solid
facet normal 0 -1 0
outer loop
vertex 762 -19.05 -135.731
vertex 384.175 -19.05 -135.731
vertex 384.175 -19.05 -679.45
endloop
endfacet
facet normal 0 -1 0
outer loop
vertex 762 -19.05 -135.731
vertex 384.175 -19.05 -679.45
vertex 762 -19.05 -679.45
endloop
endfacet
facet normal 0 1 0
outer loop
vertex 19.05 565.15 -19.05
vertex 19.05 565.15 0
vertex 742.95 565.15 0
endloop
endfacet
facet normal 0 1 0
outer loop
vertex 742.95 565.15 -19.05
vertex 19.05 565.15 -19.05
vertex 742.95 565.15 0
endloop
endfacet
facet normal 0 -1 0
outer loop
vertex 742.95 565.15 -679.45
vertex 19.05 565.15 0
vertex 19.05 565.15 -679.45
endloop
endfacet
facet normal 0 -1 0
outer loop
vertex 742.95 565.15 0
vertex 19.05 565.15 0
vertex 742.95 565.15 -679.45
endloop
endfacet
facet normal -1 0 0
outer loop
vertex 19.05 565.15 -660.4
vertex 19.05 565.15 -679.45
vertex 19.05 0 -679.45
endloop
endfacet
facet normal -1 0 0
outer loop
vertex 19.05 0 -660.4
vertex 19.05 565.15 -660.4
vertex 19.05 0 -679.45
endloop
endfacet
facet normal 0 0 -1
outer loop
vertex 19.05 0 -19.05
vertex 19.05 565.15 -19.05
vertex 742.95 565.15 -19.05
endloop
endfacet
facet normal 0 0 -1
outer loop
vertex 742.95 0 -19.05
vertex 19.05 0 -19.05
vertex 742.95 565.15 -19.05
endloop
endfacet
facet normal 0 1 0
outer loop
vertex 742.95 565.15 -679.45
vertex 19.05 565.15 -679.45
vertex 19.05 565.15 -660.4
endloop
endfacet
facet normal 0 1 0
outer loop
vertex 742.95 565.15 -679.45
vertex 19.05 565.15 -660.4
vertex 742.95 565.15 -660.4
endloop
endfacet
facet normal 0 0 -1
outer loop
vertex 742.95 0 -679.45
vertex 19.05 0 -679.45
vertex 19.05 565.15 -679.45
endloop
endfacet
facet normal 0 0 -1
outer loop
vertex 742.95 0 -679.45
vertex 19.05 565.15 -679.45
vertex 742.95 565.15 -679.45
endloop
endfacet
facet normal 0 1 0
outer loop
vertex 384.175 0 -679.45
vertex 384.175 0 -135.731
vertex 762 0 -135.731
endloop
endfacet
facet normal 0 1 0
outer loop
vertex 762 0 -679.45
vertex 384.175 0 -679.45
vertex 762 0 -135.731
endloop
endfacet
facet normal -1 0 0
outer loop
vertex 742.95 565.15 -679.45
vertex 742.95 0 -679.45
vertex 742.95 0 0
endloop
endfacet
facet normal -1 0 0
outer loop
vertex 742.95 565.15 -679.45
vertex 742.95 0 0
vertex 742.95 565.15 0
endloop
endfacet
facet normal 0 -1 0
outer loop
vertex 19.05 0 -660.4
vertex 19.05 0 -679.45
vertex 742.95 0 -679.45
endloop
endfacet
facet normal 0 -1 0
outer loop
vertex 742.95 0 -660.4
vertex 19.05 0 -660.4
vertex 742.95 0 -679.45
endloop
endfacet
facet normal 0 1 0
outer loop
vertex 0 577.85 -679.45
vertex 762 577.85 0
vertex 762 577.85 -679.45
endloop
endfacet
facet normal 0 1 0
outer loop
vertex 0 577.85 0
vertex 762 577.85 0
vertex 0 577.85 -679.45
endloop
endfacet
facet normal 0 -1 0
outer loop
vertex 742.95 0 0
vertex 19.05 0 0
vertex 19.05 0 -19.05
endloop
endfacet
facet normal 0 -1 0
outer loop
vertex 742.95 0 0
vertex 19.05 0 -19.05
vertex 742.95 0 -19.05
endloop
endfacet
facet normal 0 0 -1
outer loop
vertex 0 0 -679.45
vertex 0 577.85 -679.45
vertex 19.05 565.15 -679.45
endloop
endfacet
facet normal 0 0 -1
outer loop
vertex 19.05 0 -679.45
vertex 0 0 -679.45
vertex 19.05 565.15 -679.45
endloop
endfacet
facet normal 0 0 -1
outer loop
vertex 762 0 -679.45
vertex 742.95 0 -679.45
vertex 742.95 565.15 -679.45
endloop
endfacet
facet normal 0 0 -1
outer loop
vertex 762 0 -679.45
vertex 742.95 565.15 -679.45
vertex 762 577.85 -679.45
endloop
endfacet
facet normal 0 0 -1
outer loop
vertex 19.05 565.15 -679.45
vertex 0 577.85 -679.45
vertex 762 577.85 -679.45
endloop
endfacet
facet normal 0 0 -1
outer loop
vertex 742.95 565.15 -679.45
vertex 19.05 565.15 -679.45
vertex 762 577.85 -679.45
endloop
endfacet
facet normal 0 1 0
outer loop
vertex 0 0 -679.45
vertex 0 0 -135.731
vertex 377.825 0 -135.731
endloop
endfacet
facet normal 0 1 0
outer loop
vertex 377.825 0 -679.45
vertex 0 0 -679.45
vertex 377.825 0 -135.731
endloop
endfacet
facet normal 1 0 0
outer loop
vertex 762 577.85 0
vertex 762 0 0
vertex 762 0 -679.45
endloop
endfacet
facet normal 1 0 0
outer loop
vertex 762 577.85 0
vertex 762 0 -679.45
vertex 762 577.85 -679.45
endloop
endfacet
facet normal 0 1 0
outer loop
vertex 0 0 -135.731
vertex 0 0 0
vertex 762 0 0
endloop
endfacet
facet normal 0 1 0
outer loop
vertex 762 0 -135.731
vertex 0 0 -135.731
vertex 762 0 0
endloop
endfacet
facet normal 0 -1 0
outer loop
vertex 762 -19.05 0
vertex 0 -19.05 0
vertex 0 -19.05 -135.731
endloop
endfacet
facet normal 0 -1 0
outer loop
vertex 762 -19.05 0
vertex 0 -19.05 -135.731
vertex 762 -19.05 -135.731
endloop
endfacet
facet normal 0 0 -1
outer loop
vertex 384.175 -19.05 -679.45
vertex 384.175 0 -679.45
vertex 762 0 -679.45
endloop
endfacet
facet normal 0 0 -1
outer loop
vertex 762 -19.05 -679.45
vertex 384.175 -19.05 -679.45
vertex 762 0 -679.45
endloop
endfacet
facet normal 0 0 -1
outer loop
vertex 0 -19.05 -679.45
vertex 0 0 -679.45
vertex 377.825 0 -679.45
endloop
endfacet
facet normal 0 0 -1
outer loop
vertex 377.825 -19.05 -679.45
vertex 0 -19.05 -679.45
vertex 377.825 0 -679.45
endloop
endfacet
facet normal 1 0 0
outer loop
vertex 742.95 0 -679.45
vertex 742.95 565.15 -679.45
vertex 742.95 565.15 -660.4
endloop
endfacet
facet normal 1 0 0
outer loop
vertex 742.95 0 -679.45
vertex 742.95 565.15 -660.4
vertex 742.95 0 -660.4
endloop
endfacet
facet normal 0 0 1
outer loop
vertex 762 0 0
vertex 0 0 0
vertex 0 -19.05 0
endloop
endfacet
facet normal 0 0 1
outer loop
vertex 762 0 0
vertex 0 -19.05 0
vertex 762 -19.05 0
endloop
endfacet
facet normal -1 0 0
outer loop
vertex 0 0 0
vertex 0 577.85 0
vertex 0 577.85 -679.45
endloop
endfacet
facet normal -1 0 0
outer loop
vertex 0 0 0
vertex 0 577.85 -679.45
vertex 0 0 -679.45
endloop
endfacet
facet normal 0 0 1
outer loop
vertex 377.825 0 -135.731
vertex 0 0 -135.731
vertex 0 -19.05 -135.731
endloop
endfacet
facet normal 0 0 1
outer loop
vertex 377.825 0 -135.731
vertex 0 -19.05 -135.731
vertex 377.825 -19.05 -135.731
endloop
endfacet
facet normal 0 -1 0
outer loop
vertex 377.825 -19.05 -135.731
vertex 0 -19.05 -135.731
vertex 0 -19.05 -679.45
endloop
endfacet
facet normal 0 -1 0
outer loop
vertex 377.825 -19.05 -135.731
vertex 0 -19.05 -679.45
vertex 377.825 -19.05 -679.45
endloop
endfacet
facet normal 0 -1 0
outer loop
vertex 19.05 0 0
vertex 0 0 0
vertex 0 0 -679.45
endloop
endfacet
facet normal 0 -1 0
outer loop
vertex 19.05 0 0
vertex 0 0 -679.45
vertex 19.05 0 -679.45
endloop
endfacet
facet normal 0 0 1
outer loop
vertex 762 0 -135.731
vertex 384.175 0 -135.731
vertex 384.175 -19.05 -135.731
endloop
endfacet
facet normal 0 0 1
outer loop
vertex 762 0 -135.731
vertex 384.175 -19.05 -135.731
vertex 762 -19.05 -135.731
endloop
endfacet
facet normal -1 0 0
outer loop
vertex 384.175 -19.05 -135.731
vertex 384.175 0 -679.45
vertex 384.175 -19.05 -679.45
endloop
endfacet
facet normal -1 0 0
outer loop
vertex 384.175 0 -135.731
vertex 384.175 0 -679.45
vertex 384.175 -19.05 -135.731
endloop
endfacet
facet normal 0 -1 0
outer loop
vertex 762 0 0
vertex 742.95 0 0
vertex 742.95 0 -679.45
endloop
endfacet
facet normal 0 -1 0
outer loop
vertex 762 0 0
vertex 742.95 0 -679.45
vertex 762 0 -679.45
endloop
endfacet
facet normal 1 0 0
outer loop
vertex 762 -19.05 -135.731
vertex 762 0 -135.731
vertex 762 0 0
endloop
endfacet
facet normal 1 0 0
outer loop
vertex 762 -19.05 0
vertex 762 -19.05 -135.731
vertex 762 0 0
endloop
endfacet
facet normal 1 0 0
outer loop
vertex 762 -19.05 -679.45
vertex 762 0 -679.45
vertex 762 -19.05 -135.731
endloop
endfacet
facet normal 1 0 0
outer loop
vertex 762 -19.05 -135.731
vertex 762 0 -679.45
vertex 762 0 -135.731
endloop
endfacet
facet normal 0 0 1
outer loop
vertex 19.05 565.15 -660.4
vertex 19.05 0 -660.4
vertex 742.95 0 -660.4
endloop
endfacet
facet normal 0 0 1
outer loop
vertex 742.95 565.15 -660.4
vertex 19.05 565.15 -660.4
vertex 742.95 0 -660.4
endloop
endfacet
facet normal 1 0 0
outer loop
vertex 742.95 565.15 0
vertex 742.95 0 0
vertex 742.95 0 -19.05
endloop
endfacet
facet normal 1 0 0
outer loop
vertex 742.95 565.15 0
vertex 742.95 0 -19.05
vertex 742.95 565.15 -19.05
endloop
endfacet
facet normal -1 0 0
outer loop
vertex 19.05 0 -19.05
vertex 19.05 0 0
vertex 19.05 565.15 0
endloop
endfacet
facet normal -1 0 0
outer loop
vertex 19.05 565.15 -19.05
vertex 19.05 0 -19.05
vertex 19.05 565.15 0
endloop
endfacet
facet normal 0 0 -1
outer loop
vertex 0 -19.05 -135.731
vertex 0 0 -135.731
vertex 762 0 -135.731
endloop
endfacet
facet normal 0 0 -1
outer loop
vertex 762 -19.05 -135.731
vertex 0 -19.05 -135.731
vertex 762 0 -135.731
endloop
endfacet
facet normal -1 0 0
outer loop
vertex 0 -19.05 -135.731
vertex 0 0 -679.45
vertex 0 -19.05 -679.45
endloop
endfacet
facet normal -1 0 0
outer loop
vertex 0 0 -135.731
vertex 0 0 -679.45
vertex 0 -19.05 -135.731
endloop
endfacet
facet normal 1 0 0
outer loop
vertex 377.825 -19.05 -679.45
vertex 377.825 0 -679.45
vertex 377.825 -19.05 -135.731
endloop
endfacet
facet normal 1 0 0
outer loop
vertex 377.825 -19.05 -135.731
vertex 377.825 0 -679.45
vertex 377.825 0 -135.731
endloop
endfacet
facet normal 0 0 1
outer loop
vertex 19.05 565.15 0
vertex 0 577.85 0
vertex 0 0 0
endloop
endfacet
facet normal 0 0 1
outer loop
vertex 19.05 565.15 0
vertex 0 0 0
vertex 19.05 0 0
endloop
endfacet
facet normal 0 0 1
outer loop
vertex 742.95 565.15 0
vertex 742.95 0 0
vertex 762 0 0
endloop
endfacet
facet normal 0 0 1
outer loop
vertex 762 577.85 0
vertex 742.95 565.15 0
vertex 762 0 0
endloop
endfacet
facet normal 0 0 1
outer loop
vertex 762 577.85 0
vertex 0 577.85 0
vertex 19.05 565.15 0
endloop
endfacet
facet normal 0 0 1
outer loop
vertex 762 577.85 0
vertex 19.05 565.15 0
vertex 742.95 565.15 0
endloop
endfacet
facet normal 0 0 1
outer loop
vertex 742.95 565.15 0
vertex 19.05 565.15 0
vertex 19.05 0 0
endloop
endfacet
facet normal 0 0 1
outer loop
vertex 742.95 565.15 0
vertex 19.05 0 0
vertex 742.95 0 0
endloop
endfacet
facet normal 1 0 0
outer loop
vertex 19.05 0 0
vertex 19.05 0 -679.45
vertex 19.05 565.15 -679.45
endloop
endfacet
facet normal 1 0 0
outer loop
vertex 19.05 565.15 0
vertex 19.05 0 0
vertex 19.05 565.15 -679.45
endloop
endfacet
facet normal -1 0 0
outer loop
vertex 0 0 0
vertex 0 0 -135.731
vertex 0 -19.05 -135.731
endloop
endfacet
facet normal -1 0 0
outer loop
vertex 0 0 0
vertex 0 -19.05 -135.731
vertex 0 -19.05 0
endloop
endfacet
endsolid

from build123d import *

# Parameters (mm, degrees)
F4_W      = 19.05
F4_H      = 565.15
F5_DEPTH  = 679.45
F6_W      = 723.9
F6_H      = 565.15
F7_DEPTH  = 19.05
F8_W      = 723.9
F8_H      = 565.15
F9_DEPTH  = 19.05
F10_W     = 762
F10_H     = 135.73125
F11_DEPTH = 19.05
F12_W     = 723.9
F12_H     = 19.05
F13_DEPTH = 565.15
F15_DEPTH = 19.05
F19_W     = 377.825
F19_H     = 543.71875
F20_DEPTH = 19.05


# Not quite as in the source:
# - a variable given as a bare number and used for a length is read in inches; the dataset says mm whatever the document's units were


with BuildPart() as f5:
    # F4 (on Top) → F5 (new body)
    with BuildSketch(Plane.XY):
        Polygon((762, 577.85), (0, 577.85), (0, 565.15), (19.05, 565.15), (742.95, 565.15), (762, 565.15), align=None)
        with Locations((9.525, 282.575)):
            Rectangle(F4_W, F4_H)
        with Locations((752.475, 282.575)):
            Rectangle(F4_W, F4_H)
    extrude(amount=-F5_DEPTH)


with BuildPart() as f7:
    # F6 (on Top) → F7 (new body)
    with BuildSketch(Plane.XY):
        with Locations((381, 282.575)):
            Rectangle(F6_W, F6_H)
    extrude(amount=-F7_DEPTH)


with BuildPart() as f9:
    # F8 (on face) → F9 (new body)
    with BuildSketch(Plane(origin=(0, 0, -679.45), x_dir=(1, 0, 0), z_dir=(0, 0, -1))):
        with Locations((381, -282.575)):
            Rectangle(F8_W, F8_H)
    extrude(amount=-F9_DEPTH)


with BuildPart() as f11:
    # F10 (on face) → F11 (new body)
    with BuildSketch(Plane.XZ):
        with Locations((381, -67.865625)):
            Rectangle(F10_W, F10_H)
    extrude(amount=F11_DEPTH)


with BuildPart() as f13:
    # F12 (on face) → F13 (new body)
    with BuildSketch(Plane.XZ.offset(-565.15)):
        with Locations((381, -349.25)):
            Rectangle(F12_W, F12_H)
    extrude(amount=F13_DEPTH)


with BuildPart() as f15:
    # F14 (on face) → F15 (new body)
    with BuildSketch(Plane.XZ):
        Polygon((762, -135.73125), (742.95, -135.73125), (742.95, -339.725), (742.95, -358.775), (742.95, -660.4), (742.95, -679.45), (762, -679.45), align=None)
        Polygon((742.95, -358.775), (742.95, -339.725), (19.05, -339.725), (19.05, -135.73125), (0, -135.73125), (0, -679.45), (19.05, -679.45), (742.95, -679.45), (742.95, -660.4), (19.05, -660.4), (19.05, -358.775), align=None)
    extrude(amount=F15_DEPTH)


with BuildPart() as f20:
    # F19 (on Front) → F20 (new body)
    with BuildSketch(Plane.XZ):
        with Locations((188.9125, -407.590625)):
            Rectangle(F19_W, F19_H)
    extrude(amount=F20_DEPTH)


with BuildPart() as f20b:
    # F19 (on Front) → F20, piece 2 (new body)
    with BuildSketch(Plane.XZ):
        with Locations((573.0875, -407.590625)):
            Rectangle(F19_W, F19_H)
    extrude(amount=F20_DEPTH)


solid = Compound([f5.part, f7.part, f9.part, f11.part, f20.part, f20b.part])
